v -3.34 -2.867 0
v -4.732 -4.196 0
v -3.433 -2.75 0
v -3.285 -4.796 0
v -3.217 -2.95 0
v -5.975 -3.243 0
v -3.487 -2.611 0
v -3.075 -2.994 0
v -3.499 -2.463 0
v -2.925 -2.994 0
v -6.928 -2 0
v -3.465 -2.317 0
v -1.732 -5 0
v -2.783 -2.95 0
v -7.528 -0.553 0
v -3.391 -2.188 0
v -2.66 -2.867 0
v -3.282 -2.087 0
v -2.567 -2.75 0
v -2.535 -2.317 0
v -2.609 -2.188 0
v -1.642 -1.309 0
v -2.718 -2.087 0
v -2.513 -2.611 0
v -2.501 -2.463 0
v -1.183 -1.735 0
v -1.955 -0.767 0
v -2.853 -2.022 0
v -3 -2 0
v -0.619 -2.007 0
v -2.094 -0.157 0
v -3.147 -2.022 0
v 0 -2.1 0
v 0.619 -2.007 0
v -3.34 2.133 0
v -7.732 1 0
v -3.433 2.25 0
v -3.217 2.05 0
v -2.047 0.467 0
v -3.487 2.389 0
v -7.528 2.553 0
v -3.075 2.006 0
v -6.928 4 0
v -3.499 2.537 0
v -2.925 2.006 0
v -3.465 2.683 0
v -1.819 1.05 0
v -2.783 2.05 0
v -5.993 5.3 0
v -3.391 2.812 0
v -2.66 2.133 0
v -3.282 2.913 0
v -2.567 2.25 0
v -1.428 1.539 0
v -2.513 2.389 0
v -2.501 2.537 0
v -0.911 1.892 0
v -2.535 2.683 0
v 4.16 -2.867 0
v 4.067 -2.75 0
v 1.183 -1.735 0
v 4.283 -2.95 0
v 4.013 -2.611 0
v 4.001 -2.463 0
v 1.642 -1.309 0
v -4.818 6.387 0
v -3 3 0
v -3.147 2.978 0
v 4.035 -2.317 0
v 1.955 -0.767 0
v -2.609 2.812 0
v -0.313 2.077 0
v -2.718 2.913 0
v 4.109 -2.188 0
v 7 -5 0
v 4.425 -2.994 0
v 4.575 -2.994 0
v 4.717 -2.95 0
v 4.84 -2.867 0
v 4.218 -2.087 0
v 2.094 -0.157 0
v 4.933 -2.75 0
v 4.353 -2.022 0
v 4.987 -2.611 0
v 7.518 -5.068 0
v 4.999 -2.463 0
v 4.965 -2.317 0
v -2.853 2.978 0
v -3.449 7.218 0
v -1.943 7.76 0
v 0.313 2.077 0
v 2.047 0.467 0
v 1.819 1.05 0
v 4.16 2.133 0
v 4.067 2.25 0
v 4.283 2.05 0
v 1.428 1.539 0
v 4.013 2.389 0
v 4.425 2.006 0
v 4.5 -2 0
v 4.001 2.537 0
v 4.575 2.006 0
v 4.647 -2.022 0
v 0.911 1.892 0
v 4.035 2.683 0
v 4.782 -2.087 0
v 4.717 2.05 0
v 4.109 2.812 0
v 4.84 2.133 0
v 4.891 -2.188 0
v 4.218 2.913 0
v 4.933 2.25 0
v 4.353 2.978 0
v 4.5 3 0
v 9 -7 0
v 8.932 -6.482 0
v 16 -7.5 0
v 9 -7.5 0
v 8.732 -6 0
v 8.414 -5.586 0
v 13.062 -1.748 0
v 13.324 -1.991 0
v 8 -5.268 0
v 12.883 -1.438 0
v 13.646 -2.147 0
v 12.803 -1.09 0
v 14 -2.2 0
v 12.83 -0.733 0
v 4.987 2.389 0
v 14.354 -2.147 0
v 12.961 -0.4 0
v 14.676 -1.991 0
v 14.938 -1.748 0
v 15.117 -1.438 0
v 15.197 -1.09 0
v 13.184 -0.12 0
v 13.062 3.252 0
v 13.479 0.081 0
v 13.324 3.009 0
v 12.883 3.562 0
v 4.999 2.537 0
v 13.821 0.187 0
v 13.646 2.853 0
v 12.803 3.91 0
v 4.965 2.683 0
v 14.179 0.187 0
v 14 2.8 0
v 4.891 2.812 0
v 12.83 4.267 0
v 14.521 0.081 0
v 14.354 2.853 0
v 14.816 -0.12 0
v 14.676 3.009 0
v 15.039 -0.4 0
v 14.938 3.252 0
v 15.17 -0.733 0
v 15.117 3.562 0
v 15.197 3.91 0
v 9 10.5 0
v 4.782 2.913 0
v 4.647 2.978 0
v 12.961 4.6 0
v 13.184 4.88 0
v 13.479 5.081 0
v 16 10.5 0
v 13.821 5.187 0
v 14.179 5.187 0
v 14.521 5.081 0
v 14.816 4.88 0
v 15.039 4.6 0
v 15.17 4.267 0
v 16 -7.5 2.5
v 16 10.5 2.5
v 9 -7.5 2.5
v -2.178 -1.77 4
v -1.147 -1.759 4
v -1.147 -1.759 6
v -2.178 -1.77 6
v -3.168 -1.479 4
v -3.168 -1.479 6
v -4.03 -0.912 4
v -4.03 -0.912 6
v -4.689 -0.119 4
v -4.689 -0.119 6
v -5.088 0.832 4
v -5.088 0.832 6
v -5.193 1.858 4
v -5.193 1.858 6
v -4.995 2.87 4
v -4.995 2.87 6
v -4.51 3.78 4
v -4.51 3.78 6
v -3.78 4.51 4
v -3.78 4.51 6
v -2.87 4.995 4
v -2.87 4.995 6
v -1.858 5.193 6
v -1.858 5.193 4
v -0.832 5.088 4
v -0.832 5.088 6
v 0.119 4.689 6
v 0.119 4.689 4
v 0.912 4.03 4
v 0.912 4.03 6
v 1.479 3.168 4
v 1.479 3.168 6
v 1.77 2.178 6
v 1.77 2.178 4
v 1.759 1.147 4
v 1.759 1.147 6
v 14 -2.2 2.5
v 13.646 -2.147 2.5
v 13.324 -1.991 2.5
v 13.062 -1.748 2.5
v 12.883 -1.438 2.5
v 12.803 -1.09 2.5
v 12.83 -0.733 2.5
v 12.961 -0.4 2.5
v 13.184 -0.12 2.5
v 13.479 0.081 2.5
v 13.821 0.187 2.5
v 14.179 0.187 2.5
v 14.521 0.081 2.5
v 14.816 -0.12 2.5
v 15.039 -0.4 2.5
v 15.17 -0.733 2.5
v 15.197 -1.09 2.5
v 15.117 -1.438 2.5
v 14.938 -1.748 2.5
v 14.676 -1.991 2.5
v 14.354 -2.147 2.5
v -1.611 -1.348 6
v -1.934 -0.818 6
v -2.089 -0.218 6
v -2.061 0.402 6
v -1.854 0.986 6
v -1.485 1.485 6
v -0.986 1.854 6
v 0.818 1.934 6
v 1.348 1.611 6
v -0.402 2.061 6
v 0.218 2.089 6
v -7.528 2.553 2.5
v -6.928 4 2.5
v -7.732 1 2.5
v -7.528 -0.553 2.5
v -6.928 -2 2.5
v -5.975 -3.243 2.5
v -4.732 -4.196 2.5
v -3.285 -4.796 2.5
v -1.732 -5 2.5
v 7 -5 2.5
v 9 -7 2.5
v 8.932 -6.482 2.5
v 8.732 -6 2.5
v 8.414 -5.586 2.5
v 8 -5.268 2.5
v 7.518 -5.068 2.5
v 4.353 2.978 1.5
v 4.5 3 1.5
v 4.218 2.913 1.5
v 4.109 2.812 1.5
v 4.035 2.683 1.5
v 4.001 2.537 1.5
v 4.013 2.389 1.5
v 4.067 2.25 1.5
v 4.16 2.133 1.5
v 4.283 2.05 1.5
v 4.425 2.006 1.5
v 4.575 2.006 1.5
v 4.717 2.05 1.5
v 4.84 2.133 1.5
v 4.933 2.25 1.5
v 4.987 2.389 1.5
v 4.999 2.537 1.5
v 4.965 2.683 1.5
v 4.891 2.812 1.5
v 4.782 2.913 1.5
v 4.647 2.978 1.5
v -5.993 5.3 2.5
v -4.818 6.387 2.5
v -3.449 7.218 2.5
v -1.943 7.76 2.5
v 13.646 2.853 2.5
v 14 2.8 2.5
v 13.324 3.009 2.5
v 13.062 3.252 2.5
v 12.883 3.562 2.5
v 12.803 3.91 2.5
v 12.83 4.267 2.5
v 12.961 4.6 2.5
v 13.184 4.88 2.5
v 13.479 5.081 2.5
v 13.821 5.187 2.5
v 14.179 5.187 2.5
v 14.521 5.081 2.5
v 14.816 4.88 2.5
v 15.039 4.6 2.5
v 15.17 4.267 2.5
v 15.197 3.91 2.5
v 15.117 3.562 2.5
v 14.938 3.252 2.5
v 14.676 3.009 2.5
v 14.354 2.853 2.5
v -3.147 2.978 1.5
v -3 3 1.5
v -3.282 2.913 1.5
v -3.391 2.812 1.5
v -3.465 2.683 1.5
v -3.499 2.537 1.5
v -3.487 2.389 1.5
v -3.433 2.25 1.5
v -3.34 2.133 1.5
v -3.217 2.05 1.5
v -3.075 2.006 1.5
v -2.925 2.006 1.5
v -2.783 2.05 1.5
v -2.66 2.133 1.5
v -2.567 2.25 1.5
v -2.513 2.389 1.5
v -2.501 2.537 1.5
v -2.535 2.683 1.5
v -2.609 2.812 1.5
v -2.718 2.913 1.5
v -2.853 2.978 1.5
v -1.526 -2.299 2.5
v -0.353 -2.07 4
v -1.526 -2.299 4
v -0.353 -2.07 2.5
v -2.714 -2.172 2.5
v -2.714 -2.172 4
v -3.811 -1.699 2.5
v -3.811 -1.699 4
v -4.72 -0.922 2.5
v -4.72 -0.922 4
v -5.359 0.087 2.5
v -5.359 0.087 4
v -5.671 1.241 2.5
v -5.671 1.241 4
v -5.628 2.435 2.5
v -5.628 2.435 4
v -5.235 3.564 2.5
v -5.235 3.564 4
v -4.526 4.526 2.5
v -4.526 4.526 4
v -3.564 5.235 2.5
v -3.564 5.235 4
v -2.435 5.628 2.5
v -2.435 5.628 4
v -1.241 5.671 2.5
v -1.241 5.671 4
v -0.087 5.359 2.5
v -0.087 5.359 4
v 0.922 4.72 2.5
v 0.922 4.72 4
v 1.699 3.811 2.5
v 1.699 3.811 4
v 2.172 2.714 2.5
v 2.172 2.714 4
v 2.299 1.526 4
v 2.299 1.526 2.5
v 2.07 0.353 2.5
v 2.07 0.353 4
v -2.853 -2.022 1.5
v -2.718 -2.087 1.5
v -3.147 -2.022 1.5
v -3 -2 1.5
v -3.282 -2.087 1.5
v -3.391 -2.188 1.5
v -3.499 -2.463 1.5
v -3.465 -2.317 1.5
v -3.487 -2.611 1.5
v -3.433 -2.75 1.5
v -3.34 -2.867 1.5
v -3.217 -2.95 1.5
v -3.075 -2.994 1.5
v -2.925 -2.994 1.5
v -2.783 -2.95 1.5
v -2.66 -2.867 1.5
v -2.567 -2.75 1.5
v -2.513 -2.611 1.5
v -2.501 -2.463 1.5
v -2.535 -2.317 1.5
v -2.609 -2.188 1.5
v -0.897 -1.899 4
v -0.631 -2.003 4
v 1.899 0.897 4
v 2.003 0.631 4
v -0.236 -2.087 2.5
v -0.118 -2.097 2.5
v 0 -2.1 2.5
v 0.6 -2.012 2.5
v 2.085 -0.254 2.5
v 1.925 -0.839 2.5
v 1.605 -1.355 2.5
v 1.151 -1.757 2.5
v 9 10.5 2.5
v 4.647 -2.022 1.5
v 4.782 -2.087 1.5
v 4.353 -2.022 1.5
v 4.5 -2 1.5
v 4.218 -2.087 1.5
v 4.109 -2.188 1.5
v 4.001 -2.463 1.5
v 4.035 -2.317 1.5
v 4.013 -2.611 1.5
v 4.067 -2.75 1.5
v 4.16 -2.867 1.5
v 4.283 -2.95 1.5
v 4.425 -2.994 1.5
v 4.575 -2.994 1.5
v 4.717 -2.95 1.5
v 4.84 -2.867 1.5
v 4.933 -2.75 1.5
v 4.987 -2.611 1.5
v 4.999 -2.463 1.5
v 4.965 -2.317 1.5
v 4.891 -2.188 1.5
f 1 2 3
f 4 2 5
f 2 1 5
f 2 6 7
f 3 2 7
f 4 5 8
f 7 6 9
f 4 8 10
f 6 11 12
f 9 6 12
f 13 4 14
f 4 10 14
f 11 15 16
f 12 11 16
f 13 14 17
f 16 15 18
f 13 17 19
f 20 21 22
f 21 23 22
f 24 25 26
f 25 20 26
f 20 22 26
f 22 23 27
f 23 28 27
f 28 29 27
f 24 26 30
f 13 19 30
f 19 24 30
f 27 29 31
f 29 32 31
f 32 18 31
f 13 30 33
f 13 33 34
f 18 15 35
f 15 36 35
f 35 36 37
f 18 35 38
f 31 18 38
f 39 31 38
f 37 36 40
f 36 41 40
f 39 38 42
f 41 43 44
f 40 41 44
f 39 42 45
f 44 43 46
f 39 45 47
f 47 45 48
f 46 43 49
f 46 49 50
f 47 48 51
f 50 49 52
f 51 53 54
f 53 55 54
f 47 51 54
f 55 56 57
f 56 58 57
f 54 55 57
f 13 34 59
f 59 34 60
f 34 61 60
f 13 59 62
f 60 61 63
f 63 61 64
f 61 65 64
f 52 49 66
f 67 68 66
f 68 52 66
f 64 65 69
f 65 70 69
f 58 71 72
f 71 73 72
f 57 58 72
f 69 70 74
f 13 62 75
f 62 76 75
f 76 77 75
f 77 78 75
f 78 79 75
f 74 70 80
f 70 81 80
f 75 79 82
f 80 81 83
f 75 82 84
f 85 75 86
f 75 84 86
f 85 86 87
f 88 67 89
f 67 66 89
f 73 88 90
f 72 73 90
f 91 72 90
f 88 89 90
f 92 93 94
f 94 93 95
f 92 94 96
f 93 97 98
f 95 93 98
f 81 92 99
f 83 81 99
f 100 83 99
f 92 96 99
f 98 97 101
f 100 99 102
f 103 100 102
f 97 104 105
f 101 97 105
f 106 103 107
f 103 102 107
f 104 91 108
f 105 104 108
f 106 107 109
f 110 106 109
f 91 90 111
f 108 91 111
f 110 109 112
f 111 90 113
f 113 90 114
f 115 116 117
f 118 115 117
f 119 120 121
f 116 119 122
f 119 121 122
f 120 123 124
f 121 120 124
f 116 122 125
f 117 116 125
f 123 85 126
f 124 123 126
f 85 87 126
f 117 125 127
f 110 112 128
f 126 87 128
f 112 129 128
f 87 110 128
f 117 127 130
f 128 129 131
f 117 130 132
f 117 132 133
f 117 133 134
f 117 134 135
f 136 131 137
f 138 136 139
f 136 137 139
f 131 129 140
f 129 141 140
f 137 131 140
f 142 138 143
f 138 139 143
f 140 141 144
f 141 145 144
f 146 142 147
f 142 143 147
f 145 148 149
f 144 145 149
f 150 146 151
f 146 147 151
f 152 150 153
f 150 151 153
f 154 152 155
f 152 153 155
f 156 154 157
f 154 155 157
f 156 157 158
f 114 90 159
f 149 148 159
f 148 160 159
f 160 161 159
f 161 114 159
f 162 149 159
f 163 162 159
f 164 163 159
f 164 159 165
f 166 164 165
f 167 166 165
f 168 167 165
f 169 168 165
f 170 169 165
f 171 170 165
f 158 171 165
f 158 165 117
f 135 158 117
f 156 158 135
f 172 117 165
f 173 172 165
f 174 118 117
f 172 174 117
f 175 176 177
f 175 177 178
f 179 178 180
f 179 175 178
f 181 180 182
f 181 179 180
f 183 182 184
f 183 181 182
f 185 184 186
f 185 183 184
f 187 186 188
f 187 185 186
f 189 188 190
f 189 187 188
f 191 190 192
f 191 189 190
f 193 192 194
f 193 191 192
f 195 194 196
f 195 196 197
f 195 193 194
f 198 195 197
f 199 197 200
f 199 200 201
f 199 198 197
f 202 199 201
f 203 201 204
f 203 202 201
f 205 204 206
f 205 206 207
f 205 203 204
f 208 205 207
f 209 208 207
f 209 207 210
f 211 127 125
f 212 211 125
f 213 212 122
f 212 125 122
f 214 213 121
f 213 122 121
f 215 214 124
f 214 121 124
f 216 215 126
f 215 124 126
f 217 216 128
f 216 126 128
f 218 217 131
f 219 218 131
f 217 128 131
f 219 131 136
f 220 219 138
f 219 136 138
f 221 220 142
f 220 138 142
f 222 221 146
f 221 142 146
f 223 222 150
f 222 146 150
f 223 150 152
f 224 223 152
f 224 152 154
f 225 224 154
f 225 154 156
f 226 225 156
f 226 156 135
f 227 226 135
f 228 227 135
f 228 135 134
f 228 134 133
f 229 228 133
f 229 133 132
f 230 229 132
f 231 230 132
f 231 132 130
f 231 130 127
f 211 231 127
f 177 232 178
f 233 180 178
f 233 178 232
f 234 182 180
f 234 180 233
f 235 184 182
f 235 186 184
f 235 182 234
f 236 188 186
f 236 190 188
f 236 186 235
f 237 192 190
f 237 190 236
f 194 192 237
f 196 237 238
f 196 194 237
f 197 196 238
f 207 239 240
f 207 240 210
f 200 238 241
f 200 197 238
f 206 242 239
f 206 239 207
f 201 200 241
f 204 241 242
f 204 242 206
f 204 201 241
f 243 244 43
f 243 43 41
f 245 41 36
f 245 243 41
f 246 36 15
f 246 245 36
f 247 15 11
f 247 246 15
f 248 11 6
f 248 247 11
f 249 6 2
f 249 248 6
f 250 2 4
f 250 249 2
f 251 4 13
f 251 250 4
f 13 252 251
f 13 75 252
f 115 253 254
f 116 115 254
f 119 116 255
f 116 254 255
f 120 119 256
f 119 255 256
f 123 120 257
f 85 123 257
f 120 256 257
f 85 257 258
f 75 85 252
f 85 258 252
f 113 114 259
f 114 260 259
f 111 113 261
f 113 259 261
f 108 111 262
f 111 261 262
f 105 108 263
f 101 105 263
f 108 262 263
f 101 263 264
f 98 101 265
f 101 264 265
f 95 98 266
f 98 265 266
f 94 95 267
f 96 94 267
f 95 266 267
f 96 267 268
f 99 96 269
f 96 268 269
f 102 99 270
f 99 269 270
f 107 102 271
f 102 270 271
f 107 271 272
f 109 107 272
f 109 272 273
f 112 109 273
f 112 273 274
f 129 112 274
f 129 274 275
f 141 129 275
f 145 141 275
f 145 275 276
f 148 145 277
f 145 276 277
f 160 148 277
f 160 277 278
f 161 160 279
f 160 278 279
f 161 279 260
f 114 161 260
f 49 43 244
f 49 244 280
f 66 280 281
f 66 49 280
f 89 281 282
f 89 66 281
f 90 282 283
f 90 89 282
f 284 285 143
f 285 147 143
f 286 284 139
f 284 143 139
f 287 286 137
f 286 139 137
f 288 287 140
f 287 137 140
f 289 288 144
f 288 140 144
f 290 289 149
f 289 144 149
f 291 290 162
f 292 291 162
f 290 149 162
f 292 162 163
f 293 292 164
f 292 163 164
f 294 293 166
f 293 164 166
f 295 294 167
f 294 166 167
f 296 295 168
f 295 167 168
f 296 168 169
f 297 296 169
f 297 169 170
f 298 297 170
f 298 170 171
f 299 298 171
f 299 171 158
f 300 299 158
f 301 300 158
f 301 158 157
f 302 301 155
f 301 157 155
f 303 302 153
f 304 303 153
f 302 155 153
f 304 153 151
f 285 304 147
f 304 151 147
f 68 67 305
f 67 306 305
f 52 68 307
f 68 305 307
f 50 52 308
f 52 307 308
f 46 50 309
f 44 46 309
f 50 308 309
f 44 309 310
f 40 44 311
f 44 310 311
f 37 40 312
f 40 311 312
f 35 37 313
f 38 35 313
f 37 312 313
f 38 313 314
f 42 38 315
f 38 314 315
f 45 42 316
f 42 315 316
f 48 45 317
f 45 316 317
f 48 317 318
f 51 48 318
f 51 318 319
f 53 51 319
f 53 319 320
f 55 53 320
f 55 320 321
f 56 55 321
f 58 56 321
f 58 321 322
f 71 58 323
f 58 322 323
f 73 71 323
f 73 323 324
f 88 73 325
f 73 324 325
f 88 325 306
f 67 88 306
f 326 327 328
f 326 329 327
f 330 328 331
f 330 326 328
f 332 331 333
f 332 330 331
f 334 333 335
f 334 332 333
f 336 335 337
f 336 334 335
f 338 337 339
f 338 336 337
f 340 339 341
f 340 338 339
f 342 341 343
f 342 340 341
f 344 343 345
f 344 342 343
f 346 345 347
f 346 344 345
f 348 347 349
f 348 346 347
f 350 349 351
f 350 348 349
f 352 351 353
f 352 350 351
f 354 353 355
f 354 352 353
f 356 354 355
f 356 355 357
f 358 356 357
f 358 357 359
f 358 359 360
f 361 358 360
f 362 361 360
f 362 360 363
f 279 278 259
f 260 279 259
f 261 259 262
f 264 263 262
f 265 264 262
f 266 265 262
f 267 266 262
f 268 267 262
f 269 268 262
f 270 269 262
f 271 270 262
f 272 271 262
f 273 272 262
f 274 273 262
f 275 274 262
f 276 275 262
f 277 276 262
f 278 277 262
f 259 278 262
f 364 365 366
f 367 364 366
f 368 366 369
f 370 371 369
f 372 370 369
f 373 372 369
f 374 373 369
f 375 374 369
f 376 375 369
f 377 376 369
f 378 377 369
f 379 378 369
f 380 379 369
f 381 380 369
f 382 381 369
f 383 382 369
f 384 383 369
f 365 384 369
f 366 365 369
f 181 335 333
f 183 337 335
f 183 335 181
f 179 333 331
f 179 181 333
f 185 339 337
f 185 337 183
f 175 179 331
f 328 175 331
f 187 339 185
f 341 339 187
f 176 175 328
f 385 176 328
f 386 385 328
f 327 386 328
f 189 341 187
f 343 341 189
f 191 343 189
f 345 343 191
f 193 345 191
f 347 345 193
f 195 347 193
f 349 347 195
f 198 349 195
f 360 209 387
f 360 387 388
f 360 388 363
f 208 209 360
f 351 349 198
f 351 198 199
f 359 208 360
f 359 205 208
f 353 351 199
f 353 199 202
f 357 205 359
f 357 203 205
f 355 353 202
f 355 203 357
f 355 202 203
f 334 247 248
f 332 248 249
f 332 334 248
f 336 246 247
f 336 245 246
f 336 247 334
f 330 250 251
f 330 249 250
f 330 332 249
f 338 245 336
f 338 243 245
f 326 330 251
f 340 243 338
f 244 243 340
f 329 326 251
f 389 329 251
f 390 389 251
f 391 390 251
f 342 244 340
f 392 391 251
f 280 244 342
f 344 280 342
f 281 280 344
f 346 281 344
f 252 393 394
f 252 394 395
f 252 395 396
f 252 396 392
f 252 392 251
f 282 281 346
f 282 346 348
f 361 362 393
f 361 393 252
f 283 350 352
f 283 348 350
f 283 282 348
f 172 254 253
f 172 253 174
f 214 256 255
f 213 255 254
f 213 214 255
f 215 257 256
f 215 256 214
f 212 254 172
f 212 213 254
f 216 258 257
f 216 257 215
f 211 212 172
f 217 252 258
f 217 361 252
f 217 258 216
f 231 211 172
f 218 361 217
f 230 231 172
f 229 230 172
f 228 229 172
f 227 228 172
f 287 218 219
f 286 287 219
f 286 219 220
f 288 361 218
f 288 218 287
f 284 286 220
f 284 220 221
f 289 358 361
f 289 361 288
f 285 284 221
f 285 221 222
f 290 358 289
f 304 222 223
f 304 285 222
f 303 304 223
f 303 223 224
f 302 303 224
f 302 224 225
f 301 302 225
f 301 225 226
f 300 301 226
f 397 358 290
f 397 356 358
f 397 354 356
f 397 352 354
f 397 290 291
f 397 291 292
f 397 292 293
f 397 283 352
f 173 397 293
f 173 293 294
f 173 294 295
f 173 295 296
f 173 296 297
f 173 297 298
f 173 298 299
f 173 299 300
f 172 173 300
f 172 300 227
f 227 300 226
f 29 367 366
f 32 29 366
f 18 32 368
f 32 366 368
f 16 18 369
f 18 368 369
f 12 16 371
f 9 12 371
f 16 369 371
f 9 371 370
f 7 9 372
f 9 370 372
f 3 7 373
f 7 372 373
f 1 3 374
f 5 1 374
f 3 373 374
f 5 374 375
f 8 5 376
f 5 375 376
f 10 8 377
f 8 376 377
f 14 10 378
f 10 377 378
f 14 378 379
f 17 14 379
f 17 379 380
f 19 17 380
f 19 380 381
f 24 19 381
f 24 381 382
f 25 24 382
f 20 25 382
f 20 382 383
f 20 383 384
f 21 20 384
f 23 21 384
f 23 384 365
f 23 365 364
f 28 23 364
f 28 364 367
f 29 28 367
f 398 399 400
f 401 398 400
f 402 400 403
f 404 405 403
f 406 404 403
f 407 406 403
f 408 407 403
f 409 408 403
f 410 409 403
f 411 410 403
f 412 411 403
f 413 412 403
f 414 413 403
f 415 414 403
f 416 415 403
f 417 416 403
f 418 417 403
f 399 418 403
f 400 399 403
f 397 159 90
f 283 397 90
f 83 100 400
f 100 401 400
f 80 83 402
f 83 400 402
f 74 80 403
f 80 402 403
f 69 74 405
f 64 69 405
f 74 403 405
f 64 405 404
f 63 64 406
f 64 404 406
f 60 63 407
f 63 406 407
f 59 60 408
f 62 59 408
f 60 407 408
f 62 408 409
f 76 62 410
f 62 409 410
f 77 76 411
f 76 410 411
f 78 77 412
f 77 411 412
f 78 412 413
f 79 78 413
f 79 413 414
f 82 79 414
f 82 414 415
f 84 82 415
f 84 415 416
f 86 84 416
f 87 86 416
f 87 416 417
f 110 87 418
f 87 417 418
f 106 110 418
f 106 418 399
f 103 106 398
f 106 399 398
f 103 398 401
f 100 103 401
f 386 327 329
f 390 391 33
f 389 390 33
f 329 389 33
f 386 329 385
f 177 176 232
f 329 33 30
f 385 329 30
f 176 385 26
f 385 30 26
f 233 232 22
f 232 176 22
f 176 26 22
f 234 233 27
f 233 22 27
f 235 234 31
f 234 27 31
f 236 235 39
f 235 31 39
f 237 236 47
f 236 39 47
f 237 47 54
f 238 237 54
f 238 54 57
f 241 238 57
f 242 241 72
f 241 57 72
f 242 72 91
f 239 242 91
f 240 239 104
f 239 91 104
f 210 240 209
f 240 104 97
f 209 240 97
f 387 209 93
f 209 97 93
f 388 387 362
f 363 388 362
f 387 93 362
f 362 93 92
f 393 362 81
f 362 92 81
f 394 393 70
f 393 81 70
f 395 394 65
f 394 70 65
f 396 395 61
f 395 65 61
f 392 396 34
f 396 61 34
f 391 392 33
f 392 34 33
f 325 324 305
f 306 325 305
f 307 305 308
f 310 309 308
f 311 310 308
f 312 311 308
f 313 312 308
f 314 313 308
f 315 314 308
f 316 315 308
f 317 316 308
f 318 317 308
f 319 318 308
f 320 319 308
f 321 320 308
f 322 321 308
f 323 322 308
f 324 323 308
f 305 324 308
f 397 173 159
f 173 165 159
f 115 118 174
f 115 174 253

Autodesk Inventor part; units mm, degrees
ref_plane "YZ Plane" through (0, 0, 0) normal (1, 0, 0) x (0, 1, 0)
ref_plane "XZ Plane" through (0, 0, 0) normal (0, 1, 0) x (-1, 0, 0)
ref_plane "XY Plane" through (0, 0, 0) normal (0, 0, 1) x (1, 0, 0)
sketch "MCP joint" plane through (0, 0, 0) normal (0, 0, 1) x (1, 0, 0)
  point P0 (0, 0)
  point P1 (0, 0)
sketch "Sketch2" plane through (0, 0, 0) normal (0, 0, 1) x (1, 0, 0)
  line L0 (9, -7.5) -> (16, -7.5)
  line L1 (16, -7.5) -> (16, 10.5)
  line L2 (16, 10.5) -> (9, 10.5)
  circle A0 centre (0, 0) radius 8
  line L3 (9, 10.5) -> (-1.9428, 7.7605)
  line L4 (9, -7.5) -> (0.4552, -7.987)
  point P0 (16, 1.5)
  point P1 (3.5, 1.5)
  point P2 (16, 1.5)
  dimension "d0" = 18
  dimension "d3" = 16
  dimension "d94" = 1.5
  dimension "d95" = 16
  dimension "d96" = 9
  dimension "d97" = 9
extrude "base" add sketch "Sketch2" along normal blind 2.5
sketch "Sketch3" plane through (0, 0, 2.5) normal (0, 0, 1) x (1, 0, 0)
  point P0 (0, 0)
  point P1 (0, 0)
hole "bearing pocket" at (0, 0, 2.5) direction (0, 0, -1) diameter 4 end through all
sketch "Sketch13" plane through (0, 0, 0) normal (0, 0, -1) x (-1, 0, 0)
  line L0 (-9, -7.5) -> (-9, -5)
  arc A0 (-0.4552, -7.987) -> (1.9428, 7.7605) centre (0, 0) ccw projected
  line L1 (-9, -5) -> (6.245, -5)
  line L2 (-0.4552, -7.987) -> (-9, -7.5) projected
  dimension "d76" = 2.5
extrude "bottom cutout" cut sketch "Sketch13" against normal through all
fillet "Fillet2" radius 2 1 edges at (9, -5, 1.25)
fillet "Fillet4" radius 6 1 edges at (-6.245, -5, 1.25)
sketch "Sketch7" plane through (0, 0, 0) normal (0, 0, -1) x (-1, 0, 0)
  line L0 (3, 2.5) -> (-4.5, 2.5) construction
  line L1 (-4.5, 2.5) -> (-4.5, -2.5) construction
  line L2 (-4.5, -2.5) -> (3, -2.5) construction
  line L3 (3, -2.5) -> (3, 2.5) construction
  line L4 (3, 2.5) -> (-4.5, -2.5) construction
  line L5 (-4.5, 2.5) -> (3, -2.5) construction
  point P0 (0, 0)
  point P1 (-0.75, 0)
  point P2 (0, 0)
  point P3 (-0.75, 0)
  dimension "d34" = 3
  dimension "d35" = 4.5
  dimension "d36" = 5
hole "potentiometer pins" at (-3, 2.5, 0) at (-3, -2.5, 0) at (4.5, -2.5, 0) at (4.5, 2.5, 0) direction (0, 0, 1) diameter 1 depth 1.5
sketch "Sketch8" plane through (0, 0, 2.5) normal (0, 0, 1) x (1, 0, 0)
  line L0 (8.1428, 0) -> (0, 0) construction
  line L1 (0, 0) -> (-8.8782, 8.8782) construction
  circle A0 centre (-1.6971, 1.6971) radius 3.5
  dimension "d45" = 2.4
  dimension "d46" = 7
  dimension "d59" = 45
extrude "bearing" add sketch "Sketch8" along normal blind 3.5
sketch "Sketch10" plane through (0, 0, 2.5) normal (0, 0, 1) x (1, 0, 0)
  circle A0 centre (-1.6971, 1.6971) radius 3.5 projected
  circle A1 centre (-1.6971, 1.6971) radius 4
  point P0 (0, 0)
  point P1 (1.0607, -1.0607)
  dimension "d56" = 8
extrude "bearing spacer" add sketch "Sketch10" along normal blind 1.5
sketch "Sketch11" plane through (-1.6971, 1.6971, 6) normal (0, 0, 1) x (1, 0, 0)
  point P0 (1.6971, -1.6971)
  point P1 (1.6971, -1.6971)
hole "Hole4" at (0, 0, 6) direction (0, 0, -1) diameter 4.2 end through all
sketch "Sketch12" plane through (0, 0, 2.5) normal (0, 0, 1) x (1, 0, 0)
  point P0 (0, 0)
  point P1 (14, 4)
  point P2 (14, -1)
  point P3 (0, 0)
  dimension "d88" = 14
  dimension "d89" = 14
  dimension "d90" = 4
  dimension "d91" = 1
hole "mounting" at (14, 4, 2.5) at (14, -1, 2.5) direction (0, 0, -1) diameter 2.4 end through all
equation "\"d45\" = MCP_spring_arm"
equation "\"MCP_spring_arm\" = F4_MCP_spring_arm"
equation "\"F4_MCP_spring_arm\" = 2.4"
properties part number "MCP mount M F4"
